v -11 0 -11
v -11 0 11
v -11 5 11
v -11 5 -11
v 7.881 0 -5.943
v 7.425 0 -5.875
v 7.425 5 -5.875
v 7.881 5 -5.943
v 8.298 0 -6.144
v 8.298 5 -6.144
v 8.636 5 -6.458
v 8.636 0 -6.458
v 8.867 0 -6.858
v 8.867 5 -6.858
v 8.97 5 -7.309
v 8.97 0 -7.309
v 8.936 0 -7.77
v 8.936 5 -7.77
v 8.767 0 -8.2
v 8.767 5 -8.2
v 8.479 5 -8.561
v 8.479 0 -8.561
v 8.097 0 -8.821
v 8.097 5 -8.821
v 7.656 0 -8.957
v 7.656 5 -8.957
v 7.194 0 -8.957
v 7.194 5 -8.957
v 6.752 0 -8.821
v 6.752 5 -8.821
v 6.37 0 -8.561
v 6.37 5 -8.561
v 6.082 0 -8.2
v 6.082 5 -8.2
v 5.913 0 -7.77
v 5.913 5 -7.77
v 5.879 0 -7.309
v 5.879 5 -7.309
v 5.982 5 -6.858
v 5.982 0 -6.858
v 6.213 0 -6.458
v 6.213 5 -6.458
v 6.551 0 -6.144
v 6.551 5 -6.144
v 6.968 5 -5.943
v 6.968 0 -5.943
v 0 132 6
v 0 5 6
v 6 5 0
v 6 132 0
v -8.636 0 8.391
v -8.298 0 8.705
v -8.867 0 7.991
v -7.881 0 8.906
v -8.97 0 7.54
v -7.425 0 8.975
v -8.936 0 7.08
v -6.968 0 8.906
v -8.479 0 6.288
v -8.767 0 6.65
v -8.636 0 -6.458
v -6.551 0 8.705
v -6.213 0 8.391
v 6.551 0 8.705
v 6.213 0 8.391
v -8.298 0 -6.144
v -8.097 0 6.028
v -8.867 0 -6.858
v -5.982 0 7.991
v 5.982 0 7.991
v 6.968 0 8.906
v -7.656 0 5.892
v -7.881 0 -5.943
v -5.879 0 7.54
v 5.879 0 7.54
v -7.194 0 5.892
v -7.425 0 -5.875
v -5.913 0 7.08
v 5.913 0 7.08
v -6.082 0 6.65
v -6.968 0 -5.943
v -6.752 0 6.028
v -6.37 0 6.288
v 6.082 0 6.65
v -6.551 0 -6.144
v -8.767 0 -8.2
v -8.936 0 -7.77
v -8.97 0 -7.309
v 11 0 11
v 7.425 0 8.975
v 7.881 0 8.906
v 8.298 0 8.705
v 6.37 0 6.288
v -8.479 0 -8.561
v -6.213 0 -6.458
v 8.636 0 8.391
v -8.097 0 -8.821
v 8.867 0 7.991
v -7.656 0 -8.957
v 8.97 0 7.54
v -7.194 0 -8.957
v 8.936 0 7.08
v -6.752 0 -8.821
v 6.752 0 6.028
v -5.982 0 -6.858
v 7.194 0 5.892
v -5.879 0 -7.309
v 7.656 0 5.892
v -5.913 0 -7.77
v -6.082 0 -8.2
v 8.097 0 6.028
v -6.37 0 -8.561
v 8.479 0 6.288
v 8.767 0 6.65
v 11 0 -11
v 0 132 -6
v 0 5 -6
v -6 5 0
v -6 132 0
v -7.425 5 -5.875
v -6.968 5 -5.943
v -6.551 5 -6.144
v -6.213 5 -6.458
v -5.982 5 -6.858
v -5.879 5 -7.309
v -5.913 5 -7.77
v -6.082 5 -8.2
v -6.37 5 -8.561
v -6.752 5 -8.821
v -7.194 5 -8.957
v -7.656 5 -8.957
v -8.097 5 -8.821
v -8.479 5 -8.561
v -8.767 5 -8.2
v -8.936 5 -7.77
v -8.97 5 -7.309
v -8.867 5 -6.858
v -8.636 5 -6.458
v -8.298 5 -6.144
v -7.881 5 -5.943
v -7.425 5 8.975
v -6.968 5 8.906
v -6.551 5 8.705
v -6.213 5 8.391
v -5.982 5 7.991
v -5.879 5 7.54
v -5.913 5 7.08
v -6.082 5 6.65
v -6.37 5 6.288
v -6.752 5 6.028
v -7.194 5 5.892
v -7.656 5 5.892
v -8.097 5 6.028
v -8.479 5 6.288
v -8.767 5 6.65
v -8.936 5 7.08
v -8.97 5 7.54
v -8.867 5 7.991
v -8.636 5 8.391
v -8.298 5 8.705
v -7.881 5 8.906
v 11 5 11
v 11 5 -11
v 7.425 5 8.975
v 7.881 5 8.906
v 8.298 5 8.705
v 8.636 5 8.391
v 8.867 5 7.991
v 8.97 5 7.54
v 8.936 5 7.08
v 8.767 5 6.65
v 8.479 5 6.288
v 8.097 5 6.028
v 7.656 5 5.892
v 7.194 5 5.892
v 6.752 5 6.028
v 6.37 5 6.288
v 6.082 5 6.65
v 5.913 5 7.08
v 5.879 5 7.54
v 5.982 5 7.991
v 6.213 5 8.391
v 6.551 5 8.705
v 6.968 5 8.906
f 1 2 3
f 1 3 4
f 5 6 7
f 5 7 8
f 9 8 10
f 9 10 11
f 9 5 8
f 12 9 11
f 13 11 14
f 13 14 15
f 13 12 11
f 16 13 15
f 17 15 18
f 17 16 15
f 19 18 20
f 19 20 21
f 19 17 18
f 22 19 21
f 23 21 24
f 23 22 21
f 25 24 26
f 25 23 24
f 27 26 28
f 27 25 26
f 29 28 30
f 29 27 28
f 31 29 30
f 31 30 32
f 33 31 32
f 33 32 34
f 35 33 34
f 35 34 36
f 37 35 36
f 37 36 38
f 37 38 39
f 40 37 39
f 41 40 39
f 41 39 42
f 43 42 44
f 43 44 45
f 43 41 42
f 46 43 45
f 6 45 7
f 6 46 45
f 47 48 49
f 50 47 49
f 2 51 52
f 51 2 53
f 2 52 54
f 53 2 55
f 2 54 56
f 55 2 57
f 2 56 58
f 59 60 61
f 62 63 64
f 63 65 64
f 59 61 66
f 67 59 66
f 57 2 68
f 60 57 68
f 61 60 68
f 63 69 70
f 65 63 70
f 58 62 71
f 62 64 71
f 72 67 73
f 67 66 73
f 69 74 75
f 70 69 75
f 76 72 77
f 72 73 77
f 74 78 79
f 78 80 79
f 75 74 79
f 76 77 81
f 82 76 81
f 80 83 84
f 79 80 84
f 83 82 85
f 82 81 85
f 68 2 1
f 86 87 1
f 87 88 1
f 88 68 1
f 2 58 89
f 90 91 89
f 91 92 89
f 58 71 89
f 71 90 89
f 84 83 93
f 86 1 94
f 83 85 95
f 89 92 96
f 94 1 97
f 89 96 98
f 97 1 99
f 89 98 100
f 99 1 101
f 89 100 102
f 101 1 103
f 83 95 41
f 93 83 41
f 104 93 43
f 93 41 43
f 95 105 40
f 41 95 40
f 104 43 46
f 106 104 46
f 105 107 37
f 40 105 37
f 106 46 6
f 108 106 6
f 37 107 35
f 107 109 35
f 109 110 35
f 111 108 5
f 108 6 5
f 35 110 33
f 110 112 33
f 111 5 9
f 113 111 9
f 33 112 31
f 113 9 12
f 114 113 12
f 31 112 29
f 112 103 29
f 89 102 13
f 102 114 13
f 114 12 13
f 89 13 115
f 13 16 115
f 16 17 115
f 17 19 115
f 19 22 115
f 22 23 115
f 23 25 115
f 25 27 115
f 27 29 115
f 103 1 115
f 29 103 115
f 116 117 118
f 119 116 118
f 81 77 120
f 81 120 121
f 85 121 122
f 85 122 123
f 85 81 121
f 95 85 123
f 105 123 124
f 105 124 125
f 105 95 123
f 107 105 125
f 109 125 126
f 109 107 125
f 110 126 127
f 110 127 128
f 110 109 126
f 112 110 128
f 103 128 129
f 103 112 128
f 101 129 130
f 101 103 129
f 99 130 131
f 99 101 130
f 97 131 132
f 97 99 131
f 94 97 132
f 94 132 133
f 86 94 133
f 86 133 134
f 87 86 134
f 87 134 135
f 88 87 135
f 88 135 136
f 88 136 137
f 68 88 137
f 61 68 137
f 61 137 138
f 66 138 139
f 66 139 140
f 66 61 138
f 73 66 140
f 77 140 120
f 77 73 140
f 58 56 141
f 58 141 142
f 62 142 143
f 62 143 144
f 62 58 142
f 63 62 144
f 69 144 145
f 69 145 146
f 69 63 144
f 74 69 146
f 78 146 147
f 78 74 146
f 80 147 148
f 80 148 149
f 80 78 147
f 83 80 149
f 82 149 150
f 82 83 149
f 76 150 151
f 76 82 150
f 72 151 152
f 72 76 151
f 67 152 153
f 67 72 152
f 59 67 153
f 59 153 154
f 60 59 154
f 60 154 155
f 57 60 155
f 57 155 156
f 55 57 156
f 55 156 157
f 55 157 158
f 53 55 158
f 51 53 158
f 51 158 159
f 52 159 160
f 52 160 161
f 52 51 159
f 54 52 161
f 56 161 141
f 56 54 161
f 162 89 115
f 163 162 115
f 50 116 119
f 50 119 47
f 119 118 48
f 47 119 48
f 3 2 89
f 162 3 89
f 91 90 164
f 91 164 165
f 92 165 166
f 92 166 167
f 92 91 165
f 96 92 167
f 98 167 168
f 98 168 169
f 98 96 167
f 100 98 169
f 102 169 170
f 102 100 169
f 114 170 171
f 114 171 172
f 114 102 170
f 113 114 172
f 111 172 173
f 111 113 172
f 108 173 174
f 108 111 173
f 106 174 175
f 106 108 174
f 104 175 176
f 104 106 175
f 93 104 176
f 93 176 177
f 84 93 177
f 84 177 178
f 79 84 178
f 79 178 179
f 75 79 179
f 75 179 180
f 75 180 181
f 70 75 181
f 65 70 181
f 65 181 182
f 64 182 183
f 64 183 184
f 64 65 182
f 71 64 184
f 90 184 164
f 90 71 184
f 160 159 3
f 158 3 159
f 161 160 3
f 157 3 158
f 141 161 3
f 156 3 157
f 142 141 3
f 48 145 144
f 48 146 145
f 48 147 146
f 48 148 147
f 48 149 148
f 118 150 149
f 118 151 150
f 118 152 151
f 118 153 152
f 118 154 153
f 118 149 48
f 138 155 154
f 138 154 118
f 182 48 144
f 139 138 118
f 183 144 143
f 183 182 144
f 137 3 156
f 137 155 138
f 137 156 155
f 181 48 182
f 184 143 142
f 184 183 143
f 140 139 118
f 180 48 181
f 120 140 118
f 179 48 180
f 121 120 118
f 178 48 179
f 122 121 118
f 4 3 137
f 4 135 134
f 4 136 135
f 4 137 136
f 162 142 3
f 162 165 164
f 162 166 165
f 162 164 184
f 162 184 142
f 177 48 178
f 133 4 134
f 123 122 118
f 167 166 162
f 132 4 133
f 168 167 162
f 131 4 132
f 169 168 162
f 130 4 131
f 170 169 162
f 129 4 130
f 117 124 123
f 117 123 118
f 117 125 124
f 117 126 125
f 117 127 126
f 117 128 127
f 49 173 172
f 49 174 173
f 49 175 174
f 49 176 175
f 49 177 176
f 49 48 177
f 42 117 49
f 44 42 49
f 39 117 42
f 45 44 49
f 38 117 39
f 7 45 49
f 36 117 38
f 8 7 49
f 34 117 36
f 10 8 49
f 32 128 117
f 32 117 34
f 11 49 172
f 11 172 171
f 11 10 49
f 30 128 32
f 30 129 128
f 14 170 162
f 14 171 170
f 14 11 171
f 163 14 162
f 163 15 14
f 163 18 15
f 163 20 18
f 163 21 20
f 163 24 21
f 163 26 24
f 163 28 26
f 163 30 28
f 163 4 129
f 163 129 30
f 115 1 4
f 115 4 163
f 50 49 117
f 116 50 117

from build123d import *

# Parameters (mm, degrees)
SKETCH_1_W      = 22
SKETCH_1_H      = 22
SKETCH_1_R      = 1.55
EXTRUDE_1_DEPTH = 5
EXTRUDE_2_DEPTH = 127


with BuildPart() as part:
    # 草图1 → 凸台-拉伸1 (new body)
    with BuildSketch(Plane(origin=(0, 0, 0), x_dir=(1, 0, 0), z_dir=(0, 1, 0))):
        Rectangle(SKETCH_1_W, SKETCH_1_H)
        with Locations(Location((-7.424621202, 7.424621202, 0), (0, 0, 270))):
            Circle(SKETCH_1_R, mode=Mode.SUBTRACT)
        with Locations(Location((7.424621202, 7.424621202, 0), (0, 0, 270))):
            Circle(SKETCH_1_R, mode=Mode.SUBTRACT)
        with Locations(Location((7.424621202, -7.424621202, 0), (0, 0, 270))):
            Circle(SKETCH_1_R, mode=Mode.SUBTRACT)
        with Locations(Location((-7.424621202, -7.424621202, 0), (0, 0, 270))):
            Circle(SKETCH_1_R, mode=Mode.SUBTRACT)
    extrude(amount=EXTRUDE_1_DEPTH)

    # 草图2 → 凸台-拉伸2 (add)
    with BuildSketch(Plane(origin=(0, 5, 0), x_dir=(1, 0, 0), z_dir=(0, 1, 0))):
        Polygon((0, 6), (-6, 0), (0, -6), (6, 0), align=None)
    extrude(amount=EXTRUDE_2_DEPTH)


solid = part.part
